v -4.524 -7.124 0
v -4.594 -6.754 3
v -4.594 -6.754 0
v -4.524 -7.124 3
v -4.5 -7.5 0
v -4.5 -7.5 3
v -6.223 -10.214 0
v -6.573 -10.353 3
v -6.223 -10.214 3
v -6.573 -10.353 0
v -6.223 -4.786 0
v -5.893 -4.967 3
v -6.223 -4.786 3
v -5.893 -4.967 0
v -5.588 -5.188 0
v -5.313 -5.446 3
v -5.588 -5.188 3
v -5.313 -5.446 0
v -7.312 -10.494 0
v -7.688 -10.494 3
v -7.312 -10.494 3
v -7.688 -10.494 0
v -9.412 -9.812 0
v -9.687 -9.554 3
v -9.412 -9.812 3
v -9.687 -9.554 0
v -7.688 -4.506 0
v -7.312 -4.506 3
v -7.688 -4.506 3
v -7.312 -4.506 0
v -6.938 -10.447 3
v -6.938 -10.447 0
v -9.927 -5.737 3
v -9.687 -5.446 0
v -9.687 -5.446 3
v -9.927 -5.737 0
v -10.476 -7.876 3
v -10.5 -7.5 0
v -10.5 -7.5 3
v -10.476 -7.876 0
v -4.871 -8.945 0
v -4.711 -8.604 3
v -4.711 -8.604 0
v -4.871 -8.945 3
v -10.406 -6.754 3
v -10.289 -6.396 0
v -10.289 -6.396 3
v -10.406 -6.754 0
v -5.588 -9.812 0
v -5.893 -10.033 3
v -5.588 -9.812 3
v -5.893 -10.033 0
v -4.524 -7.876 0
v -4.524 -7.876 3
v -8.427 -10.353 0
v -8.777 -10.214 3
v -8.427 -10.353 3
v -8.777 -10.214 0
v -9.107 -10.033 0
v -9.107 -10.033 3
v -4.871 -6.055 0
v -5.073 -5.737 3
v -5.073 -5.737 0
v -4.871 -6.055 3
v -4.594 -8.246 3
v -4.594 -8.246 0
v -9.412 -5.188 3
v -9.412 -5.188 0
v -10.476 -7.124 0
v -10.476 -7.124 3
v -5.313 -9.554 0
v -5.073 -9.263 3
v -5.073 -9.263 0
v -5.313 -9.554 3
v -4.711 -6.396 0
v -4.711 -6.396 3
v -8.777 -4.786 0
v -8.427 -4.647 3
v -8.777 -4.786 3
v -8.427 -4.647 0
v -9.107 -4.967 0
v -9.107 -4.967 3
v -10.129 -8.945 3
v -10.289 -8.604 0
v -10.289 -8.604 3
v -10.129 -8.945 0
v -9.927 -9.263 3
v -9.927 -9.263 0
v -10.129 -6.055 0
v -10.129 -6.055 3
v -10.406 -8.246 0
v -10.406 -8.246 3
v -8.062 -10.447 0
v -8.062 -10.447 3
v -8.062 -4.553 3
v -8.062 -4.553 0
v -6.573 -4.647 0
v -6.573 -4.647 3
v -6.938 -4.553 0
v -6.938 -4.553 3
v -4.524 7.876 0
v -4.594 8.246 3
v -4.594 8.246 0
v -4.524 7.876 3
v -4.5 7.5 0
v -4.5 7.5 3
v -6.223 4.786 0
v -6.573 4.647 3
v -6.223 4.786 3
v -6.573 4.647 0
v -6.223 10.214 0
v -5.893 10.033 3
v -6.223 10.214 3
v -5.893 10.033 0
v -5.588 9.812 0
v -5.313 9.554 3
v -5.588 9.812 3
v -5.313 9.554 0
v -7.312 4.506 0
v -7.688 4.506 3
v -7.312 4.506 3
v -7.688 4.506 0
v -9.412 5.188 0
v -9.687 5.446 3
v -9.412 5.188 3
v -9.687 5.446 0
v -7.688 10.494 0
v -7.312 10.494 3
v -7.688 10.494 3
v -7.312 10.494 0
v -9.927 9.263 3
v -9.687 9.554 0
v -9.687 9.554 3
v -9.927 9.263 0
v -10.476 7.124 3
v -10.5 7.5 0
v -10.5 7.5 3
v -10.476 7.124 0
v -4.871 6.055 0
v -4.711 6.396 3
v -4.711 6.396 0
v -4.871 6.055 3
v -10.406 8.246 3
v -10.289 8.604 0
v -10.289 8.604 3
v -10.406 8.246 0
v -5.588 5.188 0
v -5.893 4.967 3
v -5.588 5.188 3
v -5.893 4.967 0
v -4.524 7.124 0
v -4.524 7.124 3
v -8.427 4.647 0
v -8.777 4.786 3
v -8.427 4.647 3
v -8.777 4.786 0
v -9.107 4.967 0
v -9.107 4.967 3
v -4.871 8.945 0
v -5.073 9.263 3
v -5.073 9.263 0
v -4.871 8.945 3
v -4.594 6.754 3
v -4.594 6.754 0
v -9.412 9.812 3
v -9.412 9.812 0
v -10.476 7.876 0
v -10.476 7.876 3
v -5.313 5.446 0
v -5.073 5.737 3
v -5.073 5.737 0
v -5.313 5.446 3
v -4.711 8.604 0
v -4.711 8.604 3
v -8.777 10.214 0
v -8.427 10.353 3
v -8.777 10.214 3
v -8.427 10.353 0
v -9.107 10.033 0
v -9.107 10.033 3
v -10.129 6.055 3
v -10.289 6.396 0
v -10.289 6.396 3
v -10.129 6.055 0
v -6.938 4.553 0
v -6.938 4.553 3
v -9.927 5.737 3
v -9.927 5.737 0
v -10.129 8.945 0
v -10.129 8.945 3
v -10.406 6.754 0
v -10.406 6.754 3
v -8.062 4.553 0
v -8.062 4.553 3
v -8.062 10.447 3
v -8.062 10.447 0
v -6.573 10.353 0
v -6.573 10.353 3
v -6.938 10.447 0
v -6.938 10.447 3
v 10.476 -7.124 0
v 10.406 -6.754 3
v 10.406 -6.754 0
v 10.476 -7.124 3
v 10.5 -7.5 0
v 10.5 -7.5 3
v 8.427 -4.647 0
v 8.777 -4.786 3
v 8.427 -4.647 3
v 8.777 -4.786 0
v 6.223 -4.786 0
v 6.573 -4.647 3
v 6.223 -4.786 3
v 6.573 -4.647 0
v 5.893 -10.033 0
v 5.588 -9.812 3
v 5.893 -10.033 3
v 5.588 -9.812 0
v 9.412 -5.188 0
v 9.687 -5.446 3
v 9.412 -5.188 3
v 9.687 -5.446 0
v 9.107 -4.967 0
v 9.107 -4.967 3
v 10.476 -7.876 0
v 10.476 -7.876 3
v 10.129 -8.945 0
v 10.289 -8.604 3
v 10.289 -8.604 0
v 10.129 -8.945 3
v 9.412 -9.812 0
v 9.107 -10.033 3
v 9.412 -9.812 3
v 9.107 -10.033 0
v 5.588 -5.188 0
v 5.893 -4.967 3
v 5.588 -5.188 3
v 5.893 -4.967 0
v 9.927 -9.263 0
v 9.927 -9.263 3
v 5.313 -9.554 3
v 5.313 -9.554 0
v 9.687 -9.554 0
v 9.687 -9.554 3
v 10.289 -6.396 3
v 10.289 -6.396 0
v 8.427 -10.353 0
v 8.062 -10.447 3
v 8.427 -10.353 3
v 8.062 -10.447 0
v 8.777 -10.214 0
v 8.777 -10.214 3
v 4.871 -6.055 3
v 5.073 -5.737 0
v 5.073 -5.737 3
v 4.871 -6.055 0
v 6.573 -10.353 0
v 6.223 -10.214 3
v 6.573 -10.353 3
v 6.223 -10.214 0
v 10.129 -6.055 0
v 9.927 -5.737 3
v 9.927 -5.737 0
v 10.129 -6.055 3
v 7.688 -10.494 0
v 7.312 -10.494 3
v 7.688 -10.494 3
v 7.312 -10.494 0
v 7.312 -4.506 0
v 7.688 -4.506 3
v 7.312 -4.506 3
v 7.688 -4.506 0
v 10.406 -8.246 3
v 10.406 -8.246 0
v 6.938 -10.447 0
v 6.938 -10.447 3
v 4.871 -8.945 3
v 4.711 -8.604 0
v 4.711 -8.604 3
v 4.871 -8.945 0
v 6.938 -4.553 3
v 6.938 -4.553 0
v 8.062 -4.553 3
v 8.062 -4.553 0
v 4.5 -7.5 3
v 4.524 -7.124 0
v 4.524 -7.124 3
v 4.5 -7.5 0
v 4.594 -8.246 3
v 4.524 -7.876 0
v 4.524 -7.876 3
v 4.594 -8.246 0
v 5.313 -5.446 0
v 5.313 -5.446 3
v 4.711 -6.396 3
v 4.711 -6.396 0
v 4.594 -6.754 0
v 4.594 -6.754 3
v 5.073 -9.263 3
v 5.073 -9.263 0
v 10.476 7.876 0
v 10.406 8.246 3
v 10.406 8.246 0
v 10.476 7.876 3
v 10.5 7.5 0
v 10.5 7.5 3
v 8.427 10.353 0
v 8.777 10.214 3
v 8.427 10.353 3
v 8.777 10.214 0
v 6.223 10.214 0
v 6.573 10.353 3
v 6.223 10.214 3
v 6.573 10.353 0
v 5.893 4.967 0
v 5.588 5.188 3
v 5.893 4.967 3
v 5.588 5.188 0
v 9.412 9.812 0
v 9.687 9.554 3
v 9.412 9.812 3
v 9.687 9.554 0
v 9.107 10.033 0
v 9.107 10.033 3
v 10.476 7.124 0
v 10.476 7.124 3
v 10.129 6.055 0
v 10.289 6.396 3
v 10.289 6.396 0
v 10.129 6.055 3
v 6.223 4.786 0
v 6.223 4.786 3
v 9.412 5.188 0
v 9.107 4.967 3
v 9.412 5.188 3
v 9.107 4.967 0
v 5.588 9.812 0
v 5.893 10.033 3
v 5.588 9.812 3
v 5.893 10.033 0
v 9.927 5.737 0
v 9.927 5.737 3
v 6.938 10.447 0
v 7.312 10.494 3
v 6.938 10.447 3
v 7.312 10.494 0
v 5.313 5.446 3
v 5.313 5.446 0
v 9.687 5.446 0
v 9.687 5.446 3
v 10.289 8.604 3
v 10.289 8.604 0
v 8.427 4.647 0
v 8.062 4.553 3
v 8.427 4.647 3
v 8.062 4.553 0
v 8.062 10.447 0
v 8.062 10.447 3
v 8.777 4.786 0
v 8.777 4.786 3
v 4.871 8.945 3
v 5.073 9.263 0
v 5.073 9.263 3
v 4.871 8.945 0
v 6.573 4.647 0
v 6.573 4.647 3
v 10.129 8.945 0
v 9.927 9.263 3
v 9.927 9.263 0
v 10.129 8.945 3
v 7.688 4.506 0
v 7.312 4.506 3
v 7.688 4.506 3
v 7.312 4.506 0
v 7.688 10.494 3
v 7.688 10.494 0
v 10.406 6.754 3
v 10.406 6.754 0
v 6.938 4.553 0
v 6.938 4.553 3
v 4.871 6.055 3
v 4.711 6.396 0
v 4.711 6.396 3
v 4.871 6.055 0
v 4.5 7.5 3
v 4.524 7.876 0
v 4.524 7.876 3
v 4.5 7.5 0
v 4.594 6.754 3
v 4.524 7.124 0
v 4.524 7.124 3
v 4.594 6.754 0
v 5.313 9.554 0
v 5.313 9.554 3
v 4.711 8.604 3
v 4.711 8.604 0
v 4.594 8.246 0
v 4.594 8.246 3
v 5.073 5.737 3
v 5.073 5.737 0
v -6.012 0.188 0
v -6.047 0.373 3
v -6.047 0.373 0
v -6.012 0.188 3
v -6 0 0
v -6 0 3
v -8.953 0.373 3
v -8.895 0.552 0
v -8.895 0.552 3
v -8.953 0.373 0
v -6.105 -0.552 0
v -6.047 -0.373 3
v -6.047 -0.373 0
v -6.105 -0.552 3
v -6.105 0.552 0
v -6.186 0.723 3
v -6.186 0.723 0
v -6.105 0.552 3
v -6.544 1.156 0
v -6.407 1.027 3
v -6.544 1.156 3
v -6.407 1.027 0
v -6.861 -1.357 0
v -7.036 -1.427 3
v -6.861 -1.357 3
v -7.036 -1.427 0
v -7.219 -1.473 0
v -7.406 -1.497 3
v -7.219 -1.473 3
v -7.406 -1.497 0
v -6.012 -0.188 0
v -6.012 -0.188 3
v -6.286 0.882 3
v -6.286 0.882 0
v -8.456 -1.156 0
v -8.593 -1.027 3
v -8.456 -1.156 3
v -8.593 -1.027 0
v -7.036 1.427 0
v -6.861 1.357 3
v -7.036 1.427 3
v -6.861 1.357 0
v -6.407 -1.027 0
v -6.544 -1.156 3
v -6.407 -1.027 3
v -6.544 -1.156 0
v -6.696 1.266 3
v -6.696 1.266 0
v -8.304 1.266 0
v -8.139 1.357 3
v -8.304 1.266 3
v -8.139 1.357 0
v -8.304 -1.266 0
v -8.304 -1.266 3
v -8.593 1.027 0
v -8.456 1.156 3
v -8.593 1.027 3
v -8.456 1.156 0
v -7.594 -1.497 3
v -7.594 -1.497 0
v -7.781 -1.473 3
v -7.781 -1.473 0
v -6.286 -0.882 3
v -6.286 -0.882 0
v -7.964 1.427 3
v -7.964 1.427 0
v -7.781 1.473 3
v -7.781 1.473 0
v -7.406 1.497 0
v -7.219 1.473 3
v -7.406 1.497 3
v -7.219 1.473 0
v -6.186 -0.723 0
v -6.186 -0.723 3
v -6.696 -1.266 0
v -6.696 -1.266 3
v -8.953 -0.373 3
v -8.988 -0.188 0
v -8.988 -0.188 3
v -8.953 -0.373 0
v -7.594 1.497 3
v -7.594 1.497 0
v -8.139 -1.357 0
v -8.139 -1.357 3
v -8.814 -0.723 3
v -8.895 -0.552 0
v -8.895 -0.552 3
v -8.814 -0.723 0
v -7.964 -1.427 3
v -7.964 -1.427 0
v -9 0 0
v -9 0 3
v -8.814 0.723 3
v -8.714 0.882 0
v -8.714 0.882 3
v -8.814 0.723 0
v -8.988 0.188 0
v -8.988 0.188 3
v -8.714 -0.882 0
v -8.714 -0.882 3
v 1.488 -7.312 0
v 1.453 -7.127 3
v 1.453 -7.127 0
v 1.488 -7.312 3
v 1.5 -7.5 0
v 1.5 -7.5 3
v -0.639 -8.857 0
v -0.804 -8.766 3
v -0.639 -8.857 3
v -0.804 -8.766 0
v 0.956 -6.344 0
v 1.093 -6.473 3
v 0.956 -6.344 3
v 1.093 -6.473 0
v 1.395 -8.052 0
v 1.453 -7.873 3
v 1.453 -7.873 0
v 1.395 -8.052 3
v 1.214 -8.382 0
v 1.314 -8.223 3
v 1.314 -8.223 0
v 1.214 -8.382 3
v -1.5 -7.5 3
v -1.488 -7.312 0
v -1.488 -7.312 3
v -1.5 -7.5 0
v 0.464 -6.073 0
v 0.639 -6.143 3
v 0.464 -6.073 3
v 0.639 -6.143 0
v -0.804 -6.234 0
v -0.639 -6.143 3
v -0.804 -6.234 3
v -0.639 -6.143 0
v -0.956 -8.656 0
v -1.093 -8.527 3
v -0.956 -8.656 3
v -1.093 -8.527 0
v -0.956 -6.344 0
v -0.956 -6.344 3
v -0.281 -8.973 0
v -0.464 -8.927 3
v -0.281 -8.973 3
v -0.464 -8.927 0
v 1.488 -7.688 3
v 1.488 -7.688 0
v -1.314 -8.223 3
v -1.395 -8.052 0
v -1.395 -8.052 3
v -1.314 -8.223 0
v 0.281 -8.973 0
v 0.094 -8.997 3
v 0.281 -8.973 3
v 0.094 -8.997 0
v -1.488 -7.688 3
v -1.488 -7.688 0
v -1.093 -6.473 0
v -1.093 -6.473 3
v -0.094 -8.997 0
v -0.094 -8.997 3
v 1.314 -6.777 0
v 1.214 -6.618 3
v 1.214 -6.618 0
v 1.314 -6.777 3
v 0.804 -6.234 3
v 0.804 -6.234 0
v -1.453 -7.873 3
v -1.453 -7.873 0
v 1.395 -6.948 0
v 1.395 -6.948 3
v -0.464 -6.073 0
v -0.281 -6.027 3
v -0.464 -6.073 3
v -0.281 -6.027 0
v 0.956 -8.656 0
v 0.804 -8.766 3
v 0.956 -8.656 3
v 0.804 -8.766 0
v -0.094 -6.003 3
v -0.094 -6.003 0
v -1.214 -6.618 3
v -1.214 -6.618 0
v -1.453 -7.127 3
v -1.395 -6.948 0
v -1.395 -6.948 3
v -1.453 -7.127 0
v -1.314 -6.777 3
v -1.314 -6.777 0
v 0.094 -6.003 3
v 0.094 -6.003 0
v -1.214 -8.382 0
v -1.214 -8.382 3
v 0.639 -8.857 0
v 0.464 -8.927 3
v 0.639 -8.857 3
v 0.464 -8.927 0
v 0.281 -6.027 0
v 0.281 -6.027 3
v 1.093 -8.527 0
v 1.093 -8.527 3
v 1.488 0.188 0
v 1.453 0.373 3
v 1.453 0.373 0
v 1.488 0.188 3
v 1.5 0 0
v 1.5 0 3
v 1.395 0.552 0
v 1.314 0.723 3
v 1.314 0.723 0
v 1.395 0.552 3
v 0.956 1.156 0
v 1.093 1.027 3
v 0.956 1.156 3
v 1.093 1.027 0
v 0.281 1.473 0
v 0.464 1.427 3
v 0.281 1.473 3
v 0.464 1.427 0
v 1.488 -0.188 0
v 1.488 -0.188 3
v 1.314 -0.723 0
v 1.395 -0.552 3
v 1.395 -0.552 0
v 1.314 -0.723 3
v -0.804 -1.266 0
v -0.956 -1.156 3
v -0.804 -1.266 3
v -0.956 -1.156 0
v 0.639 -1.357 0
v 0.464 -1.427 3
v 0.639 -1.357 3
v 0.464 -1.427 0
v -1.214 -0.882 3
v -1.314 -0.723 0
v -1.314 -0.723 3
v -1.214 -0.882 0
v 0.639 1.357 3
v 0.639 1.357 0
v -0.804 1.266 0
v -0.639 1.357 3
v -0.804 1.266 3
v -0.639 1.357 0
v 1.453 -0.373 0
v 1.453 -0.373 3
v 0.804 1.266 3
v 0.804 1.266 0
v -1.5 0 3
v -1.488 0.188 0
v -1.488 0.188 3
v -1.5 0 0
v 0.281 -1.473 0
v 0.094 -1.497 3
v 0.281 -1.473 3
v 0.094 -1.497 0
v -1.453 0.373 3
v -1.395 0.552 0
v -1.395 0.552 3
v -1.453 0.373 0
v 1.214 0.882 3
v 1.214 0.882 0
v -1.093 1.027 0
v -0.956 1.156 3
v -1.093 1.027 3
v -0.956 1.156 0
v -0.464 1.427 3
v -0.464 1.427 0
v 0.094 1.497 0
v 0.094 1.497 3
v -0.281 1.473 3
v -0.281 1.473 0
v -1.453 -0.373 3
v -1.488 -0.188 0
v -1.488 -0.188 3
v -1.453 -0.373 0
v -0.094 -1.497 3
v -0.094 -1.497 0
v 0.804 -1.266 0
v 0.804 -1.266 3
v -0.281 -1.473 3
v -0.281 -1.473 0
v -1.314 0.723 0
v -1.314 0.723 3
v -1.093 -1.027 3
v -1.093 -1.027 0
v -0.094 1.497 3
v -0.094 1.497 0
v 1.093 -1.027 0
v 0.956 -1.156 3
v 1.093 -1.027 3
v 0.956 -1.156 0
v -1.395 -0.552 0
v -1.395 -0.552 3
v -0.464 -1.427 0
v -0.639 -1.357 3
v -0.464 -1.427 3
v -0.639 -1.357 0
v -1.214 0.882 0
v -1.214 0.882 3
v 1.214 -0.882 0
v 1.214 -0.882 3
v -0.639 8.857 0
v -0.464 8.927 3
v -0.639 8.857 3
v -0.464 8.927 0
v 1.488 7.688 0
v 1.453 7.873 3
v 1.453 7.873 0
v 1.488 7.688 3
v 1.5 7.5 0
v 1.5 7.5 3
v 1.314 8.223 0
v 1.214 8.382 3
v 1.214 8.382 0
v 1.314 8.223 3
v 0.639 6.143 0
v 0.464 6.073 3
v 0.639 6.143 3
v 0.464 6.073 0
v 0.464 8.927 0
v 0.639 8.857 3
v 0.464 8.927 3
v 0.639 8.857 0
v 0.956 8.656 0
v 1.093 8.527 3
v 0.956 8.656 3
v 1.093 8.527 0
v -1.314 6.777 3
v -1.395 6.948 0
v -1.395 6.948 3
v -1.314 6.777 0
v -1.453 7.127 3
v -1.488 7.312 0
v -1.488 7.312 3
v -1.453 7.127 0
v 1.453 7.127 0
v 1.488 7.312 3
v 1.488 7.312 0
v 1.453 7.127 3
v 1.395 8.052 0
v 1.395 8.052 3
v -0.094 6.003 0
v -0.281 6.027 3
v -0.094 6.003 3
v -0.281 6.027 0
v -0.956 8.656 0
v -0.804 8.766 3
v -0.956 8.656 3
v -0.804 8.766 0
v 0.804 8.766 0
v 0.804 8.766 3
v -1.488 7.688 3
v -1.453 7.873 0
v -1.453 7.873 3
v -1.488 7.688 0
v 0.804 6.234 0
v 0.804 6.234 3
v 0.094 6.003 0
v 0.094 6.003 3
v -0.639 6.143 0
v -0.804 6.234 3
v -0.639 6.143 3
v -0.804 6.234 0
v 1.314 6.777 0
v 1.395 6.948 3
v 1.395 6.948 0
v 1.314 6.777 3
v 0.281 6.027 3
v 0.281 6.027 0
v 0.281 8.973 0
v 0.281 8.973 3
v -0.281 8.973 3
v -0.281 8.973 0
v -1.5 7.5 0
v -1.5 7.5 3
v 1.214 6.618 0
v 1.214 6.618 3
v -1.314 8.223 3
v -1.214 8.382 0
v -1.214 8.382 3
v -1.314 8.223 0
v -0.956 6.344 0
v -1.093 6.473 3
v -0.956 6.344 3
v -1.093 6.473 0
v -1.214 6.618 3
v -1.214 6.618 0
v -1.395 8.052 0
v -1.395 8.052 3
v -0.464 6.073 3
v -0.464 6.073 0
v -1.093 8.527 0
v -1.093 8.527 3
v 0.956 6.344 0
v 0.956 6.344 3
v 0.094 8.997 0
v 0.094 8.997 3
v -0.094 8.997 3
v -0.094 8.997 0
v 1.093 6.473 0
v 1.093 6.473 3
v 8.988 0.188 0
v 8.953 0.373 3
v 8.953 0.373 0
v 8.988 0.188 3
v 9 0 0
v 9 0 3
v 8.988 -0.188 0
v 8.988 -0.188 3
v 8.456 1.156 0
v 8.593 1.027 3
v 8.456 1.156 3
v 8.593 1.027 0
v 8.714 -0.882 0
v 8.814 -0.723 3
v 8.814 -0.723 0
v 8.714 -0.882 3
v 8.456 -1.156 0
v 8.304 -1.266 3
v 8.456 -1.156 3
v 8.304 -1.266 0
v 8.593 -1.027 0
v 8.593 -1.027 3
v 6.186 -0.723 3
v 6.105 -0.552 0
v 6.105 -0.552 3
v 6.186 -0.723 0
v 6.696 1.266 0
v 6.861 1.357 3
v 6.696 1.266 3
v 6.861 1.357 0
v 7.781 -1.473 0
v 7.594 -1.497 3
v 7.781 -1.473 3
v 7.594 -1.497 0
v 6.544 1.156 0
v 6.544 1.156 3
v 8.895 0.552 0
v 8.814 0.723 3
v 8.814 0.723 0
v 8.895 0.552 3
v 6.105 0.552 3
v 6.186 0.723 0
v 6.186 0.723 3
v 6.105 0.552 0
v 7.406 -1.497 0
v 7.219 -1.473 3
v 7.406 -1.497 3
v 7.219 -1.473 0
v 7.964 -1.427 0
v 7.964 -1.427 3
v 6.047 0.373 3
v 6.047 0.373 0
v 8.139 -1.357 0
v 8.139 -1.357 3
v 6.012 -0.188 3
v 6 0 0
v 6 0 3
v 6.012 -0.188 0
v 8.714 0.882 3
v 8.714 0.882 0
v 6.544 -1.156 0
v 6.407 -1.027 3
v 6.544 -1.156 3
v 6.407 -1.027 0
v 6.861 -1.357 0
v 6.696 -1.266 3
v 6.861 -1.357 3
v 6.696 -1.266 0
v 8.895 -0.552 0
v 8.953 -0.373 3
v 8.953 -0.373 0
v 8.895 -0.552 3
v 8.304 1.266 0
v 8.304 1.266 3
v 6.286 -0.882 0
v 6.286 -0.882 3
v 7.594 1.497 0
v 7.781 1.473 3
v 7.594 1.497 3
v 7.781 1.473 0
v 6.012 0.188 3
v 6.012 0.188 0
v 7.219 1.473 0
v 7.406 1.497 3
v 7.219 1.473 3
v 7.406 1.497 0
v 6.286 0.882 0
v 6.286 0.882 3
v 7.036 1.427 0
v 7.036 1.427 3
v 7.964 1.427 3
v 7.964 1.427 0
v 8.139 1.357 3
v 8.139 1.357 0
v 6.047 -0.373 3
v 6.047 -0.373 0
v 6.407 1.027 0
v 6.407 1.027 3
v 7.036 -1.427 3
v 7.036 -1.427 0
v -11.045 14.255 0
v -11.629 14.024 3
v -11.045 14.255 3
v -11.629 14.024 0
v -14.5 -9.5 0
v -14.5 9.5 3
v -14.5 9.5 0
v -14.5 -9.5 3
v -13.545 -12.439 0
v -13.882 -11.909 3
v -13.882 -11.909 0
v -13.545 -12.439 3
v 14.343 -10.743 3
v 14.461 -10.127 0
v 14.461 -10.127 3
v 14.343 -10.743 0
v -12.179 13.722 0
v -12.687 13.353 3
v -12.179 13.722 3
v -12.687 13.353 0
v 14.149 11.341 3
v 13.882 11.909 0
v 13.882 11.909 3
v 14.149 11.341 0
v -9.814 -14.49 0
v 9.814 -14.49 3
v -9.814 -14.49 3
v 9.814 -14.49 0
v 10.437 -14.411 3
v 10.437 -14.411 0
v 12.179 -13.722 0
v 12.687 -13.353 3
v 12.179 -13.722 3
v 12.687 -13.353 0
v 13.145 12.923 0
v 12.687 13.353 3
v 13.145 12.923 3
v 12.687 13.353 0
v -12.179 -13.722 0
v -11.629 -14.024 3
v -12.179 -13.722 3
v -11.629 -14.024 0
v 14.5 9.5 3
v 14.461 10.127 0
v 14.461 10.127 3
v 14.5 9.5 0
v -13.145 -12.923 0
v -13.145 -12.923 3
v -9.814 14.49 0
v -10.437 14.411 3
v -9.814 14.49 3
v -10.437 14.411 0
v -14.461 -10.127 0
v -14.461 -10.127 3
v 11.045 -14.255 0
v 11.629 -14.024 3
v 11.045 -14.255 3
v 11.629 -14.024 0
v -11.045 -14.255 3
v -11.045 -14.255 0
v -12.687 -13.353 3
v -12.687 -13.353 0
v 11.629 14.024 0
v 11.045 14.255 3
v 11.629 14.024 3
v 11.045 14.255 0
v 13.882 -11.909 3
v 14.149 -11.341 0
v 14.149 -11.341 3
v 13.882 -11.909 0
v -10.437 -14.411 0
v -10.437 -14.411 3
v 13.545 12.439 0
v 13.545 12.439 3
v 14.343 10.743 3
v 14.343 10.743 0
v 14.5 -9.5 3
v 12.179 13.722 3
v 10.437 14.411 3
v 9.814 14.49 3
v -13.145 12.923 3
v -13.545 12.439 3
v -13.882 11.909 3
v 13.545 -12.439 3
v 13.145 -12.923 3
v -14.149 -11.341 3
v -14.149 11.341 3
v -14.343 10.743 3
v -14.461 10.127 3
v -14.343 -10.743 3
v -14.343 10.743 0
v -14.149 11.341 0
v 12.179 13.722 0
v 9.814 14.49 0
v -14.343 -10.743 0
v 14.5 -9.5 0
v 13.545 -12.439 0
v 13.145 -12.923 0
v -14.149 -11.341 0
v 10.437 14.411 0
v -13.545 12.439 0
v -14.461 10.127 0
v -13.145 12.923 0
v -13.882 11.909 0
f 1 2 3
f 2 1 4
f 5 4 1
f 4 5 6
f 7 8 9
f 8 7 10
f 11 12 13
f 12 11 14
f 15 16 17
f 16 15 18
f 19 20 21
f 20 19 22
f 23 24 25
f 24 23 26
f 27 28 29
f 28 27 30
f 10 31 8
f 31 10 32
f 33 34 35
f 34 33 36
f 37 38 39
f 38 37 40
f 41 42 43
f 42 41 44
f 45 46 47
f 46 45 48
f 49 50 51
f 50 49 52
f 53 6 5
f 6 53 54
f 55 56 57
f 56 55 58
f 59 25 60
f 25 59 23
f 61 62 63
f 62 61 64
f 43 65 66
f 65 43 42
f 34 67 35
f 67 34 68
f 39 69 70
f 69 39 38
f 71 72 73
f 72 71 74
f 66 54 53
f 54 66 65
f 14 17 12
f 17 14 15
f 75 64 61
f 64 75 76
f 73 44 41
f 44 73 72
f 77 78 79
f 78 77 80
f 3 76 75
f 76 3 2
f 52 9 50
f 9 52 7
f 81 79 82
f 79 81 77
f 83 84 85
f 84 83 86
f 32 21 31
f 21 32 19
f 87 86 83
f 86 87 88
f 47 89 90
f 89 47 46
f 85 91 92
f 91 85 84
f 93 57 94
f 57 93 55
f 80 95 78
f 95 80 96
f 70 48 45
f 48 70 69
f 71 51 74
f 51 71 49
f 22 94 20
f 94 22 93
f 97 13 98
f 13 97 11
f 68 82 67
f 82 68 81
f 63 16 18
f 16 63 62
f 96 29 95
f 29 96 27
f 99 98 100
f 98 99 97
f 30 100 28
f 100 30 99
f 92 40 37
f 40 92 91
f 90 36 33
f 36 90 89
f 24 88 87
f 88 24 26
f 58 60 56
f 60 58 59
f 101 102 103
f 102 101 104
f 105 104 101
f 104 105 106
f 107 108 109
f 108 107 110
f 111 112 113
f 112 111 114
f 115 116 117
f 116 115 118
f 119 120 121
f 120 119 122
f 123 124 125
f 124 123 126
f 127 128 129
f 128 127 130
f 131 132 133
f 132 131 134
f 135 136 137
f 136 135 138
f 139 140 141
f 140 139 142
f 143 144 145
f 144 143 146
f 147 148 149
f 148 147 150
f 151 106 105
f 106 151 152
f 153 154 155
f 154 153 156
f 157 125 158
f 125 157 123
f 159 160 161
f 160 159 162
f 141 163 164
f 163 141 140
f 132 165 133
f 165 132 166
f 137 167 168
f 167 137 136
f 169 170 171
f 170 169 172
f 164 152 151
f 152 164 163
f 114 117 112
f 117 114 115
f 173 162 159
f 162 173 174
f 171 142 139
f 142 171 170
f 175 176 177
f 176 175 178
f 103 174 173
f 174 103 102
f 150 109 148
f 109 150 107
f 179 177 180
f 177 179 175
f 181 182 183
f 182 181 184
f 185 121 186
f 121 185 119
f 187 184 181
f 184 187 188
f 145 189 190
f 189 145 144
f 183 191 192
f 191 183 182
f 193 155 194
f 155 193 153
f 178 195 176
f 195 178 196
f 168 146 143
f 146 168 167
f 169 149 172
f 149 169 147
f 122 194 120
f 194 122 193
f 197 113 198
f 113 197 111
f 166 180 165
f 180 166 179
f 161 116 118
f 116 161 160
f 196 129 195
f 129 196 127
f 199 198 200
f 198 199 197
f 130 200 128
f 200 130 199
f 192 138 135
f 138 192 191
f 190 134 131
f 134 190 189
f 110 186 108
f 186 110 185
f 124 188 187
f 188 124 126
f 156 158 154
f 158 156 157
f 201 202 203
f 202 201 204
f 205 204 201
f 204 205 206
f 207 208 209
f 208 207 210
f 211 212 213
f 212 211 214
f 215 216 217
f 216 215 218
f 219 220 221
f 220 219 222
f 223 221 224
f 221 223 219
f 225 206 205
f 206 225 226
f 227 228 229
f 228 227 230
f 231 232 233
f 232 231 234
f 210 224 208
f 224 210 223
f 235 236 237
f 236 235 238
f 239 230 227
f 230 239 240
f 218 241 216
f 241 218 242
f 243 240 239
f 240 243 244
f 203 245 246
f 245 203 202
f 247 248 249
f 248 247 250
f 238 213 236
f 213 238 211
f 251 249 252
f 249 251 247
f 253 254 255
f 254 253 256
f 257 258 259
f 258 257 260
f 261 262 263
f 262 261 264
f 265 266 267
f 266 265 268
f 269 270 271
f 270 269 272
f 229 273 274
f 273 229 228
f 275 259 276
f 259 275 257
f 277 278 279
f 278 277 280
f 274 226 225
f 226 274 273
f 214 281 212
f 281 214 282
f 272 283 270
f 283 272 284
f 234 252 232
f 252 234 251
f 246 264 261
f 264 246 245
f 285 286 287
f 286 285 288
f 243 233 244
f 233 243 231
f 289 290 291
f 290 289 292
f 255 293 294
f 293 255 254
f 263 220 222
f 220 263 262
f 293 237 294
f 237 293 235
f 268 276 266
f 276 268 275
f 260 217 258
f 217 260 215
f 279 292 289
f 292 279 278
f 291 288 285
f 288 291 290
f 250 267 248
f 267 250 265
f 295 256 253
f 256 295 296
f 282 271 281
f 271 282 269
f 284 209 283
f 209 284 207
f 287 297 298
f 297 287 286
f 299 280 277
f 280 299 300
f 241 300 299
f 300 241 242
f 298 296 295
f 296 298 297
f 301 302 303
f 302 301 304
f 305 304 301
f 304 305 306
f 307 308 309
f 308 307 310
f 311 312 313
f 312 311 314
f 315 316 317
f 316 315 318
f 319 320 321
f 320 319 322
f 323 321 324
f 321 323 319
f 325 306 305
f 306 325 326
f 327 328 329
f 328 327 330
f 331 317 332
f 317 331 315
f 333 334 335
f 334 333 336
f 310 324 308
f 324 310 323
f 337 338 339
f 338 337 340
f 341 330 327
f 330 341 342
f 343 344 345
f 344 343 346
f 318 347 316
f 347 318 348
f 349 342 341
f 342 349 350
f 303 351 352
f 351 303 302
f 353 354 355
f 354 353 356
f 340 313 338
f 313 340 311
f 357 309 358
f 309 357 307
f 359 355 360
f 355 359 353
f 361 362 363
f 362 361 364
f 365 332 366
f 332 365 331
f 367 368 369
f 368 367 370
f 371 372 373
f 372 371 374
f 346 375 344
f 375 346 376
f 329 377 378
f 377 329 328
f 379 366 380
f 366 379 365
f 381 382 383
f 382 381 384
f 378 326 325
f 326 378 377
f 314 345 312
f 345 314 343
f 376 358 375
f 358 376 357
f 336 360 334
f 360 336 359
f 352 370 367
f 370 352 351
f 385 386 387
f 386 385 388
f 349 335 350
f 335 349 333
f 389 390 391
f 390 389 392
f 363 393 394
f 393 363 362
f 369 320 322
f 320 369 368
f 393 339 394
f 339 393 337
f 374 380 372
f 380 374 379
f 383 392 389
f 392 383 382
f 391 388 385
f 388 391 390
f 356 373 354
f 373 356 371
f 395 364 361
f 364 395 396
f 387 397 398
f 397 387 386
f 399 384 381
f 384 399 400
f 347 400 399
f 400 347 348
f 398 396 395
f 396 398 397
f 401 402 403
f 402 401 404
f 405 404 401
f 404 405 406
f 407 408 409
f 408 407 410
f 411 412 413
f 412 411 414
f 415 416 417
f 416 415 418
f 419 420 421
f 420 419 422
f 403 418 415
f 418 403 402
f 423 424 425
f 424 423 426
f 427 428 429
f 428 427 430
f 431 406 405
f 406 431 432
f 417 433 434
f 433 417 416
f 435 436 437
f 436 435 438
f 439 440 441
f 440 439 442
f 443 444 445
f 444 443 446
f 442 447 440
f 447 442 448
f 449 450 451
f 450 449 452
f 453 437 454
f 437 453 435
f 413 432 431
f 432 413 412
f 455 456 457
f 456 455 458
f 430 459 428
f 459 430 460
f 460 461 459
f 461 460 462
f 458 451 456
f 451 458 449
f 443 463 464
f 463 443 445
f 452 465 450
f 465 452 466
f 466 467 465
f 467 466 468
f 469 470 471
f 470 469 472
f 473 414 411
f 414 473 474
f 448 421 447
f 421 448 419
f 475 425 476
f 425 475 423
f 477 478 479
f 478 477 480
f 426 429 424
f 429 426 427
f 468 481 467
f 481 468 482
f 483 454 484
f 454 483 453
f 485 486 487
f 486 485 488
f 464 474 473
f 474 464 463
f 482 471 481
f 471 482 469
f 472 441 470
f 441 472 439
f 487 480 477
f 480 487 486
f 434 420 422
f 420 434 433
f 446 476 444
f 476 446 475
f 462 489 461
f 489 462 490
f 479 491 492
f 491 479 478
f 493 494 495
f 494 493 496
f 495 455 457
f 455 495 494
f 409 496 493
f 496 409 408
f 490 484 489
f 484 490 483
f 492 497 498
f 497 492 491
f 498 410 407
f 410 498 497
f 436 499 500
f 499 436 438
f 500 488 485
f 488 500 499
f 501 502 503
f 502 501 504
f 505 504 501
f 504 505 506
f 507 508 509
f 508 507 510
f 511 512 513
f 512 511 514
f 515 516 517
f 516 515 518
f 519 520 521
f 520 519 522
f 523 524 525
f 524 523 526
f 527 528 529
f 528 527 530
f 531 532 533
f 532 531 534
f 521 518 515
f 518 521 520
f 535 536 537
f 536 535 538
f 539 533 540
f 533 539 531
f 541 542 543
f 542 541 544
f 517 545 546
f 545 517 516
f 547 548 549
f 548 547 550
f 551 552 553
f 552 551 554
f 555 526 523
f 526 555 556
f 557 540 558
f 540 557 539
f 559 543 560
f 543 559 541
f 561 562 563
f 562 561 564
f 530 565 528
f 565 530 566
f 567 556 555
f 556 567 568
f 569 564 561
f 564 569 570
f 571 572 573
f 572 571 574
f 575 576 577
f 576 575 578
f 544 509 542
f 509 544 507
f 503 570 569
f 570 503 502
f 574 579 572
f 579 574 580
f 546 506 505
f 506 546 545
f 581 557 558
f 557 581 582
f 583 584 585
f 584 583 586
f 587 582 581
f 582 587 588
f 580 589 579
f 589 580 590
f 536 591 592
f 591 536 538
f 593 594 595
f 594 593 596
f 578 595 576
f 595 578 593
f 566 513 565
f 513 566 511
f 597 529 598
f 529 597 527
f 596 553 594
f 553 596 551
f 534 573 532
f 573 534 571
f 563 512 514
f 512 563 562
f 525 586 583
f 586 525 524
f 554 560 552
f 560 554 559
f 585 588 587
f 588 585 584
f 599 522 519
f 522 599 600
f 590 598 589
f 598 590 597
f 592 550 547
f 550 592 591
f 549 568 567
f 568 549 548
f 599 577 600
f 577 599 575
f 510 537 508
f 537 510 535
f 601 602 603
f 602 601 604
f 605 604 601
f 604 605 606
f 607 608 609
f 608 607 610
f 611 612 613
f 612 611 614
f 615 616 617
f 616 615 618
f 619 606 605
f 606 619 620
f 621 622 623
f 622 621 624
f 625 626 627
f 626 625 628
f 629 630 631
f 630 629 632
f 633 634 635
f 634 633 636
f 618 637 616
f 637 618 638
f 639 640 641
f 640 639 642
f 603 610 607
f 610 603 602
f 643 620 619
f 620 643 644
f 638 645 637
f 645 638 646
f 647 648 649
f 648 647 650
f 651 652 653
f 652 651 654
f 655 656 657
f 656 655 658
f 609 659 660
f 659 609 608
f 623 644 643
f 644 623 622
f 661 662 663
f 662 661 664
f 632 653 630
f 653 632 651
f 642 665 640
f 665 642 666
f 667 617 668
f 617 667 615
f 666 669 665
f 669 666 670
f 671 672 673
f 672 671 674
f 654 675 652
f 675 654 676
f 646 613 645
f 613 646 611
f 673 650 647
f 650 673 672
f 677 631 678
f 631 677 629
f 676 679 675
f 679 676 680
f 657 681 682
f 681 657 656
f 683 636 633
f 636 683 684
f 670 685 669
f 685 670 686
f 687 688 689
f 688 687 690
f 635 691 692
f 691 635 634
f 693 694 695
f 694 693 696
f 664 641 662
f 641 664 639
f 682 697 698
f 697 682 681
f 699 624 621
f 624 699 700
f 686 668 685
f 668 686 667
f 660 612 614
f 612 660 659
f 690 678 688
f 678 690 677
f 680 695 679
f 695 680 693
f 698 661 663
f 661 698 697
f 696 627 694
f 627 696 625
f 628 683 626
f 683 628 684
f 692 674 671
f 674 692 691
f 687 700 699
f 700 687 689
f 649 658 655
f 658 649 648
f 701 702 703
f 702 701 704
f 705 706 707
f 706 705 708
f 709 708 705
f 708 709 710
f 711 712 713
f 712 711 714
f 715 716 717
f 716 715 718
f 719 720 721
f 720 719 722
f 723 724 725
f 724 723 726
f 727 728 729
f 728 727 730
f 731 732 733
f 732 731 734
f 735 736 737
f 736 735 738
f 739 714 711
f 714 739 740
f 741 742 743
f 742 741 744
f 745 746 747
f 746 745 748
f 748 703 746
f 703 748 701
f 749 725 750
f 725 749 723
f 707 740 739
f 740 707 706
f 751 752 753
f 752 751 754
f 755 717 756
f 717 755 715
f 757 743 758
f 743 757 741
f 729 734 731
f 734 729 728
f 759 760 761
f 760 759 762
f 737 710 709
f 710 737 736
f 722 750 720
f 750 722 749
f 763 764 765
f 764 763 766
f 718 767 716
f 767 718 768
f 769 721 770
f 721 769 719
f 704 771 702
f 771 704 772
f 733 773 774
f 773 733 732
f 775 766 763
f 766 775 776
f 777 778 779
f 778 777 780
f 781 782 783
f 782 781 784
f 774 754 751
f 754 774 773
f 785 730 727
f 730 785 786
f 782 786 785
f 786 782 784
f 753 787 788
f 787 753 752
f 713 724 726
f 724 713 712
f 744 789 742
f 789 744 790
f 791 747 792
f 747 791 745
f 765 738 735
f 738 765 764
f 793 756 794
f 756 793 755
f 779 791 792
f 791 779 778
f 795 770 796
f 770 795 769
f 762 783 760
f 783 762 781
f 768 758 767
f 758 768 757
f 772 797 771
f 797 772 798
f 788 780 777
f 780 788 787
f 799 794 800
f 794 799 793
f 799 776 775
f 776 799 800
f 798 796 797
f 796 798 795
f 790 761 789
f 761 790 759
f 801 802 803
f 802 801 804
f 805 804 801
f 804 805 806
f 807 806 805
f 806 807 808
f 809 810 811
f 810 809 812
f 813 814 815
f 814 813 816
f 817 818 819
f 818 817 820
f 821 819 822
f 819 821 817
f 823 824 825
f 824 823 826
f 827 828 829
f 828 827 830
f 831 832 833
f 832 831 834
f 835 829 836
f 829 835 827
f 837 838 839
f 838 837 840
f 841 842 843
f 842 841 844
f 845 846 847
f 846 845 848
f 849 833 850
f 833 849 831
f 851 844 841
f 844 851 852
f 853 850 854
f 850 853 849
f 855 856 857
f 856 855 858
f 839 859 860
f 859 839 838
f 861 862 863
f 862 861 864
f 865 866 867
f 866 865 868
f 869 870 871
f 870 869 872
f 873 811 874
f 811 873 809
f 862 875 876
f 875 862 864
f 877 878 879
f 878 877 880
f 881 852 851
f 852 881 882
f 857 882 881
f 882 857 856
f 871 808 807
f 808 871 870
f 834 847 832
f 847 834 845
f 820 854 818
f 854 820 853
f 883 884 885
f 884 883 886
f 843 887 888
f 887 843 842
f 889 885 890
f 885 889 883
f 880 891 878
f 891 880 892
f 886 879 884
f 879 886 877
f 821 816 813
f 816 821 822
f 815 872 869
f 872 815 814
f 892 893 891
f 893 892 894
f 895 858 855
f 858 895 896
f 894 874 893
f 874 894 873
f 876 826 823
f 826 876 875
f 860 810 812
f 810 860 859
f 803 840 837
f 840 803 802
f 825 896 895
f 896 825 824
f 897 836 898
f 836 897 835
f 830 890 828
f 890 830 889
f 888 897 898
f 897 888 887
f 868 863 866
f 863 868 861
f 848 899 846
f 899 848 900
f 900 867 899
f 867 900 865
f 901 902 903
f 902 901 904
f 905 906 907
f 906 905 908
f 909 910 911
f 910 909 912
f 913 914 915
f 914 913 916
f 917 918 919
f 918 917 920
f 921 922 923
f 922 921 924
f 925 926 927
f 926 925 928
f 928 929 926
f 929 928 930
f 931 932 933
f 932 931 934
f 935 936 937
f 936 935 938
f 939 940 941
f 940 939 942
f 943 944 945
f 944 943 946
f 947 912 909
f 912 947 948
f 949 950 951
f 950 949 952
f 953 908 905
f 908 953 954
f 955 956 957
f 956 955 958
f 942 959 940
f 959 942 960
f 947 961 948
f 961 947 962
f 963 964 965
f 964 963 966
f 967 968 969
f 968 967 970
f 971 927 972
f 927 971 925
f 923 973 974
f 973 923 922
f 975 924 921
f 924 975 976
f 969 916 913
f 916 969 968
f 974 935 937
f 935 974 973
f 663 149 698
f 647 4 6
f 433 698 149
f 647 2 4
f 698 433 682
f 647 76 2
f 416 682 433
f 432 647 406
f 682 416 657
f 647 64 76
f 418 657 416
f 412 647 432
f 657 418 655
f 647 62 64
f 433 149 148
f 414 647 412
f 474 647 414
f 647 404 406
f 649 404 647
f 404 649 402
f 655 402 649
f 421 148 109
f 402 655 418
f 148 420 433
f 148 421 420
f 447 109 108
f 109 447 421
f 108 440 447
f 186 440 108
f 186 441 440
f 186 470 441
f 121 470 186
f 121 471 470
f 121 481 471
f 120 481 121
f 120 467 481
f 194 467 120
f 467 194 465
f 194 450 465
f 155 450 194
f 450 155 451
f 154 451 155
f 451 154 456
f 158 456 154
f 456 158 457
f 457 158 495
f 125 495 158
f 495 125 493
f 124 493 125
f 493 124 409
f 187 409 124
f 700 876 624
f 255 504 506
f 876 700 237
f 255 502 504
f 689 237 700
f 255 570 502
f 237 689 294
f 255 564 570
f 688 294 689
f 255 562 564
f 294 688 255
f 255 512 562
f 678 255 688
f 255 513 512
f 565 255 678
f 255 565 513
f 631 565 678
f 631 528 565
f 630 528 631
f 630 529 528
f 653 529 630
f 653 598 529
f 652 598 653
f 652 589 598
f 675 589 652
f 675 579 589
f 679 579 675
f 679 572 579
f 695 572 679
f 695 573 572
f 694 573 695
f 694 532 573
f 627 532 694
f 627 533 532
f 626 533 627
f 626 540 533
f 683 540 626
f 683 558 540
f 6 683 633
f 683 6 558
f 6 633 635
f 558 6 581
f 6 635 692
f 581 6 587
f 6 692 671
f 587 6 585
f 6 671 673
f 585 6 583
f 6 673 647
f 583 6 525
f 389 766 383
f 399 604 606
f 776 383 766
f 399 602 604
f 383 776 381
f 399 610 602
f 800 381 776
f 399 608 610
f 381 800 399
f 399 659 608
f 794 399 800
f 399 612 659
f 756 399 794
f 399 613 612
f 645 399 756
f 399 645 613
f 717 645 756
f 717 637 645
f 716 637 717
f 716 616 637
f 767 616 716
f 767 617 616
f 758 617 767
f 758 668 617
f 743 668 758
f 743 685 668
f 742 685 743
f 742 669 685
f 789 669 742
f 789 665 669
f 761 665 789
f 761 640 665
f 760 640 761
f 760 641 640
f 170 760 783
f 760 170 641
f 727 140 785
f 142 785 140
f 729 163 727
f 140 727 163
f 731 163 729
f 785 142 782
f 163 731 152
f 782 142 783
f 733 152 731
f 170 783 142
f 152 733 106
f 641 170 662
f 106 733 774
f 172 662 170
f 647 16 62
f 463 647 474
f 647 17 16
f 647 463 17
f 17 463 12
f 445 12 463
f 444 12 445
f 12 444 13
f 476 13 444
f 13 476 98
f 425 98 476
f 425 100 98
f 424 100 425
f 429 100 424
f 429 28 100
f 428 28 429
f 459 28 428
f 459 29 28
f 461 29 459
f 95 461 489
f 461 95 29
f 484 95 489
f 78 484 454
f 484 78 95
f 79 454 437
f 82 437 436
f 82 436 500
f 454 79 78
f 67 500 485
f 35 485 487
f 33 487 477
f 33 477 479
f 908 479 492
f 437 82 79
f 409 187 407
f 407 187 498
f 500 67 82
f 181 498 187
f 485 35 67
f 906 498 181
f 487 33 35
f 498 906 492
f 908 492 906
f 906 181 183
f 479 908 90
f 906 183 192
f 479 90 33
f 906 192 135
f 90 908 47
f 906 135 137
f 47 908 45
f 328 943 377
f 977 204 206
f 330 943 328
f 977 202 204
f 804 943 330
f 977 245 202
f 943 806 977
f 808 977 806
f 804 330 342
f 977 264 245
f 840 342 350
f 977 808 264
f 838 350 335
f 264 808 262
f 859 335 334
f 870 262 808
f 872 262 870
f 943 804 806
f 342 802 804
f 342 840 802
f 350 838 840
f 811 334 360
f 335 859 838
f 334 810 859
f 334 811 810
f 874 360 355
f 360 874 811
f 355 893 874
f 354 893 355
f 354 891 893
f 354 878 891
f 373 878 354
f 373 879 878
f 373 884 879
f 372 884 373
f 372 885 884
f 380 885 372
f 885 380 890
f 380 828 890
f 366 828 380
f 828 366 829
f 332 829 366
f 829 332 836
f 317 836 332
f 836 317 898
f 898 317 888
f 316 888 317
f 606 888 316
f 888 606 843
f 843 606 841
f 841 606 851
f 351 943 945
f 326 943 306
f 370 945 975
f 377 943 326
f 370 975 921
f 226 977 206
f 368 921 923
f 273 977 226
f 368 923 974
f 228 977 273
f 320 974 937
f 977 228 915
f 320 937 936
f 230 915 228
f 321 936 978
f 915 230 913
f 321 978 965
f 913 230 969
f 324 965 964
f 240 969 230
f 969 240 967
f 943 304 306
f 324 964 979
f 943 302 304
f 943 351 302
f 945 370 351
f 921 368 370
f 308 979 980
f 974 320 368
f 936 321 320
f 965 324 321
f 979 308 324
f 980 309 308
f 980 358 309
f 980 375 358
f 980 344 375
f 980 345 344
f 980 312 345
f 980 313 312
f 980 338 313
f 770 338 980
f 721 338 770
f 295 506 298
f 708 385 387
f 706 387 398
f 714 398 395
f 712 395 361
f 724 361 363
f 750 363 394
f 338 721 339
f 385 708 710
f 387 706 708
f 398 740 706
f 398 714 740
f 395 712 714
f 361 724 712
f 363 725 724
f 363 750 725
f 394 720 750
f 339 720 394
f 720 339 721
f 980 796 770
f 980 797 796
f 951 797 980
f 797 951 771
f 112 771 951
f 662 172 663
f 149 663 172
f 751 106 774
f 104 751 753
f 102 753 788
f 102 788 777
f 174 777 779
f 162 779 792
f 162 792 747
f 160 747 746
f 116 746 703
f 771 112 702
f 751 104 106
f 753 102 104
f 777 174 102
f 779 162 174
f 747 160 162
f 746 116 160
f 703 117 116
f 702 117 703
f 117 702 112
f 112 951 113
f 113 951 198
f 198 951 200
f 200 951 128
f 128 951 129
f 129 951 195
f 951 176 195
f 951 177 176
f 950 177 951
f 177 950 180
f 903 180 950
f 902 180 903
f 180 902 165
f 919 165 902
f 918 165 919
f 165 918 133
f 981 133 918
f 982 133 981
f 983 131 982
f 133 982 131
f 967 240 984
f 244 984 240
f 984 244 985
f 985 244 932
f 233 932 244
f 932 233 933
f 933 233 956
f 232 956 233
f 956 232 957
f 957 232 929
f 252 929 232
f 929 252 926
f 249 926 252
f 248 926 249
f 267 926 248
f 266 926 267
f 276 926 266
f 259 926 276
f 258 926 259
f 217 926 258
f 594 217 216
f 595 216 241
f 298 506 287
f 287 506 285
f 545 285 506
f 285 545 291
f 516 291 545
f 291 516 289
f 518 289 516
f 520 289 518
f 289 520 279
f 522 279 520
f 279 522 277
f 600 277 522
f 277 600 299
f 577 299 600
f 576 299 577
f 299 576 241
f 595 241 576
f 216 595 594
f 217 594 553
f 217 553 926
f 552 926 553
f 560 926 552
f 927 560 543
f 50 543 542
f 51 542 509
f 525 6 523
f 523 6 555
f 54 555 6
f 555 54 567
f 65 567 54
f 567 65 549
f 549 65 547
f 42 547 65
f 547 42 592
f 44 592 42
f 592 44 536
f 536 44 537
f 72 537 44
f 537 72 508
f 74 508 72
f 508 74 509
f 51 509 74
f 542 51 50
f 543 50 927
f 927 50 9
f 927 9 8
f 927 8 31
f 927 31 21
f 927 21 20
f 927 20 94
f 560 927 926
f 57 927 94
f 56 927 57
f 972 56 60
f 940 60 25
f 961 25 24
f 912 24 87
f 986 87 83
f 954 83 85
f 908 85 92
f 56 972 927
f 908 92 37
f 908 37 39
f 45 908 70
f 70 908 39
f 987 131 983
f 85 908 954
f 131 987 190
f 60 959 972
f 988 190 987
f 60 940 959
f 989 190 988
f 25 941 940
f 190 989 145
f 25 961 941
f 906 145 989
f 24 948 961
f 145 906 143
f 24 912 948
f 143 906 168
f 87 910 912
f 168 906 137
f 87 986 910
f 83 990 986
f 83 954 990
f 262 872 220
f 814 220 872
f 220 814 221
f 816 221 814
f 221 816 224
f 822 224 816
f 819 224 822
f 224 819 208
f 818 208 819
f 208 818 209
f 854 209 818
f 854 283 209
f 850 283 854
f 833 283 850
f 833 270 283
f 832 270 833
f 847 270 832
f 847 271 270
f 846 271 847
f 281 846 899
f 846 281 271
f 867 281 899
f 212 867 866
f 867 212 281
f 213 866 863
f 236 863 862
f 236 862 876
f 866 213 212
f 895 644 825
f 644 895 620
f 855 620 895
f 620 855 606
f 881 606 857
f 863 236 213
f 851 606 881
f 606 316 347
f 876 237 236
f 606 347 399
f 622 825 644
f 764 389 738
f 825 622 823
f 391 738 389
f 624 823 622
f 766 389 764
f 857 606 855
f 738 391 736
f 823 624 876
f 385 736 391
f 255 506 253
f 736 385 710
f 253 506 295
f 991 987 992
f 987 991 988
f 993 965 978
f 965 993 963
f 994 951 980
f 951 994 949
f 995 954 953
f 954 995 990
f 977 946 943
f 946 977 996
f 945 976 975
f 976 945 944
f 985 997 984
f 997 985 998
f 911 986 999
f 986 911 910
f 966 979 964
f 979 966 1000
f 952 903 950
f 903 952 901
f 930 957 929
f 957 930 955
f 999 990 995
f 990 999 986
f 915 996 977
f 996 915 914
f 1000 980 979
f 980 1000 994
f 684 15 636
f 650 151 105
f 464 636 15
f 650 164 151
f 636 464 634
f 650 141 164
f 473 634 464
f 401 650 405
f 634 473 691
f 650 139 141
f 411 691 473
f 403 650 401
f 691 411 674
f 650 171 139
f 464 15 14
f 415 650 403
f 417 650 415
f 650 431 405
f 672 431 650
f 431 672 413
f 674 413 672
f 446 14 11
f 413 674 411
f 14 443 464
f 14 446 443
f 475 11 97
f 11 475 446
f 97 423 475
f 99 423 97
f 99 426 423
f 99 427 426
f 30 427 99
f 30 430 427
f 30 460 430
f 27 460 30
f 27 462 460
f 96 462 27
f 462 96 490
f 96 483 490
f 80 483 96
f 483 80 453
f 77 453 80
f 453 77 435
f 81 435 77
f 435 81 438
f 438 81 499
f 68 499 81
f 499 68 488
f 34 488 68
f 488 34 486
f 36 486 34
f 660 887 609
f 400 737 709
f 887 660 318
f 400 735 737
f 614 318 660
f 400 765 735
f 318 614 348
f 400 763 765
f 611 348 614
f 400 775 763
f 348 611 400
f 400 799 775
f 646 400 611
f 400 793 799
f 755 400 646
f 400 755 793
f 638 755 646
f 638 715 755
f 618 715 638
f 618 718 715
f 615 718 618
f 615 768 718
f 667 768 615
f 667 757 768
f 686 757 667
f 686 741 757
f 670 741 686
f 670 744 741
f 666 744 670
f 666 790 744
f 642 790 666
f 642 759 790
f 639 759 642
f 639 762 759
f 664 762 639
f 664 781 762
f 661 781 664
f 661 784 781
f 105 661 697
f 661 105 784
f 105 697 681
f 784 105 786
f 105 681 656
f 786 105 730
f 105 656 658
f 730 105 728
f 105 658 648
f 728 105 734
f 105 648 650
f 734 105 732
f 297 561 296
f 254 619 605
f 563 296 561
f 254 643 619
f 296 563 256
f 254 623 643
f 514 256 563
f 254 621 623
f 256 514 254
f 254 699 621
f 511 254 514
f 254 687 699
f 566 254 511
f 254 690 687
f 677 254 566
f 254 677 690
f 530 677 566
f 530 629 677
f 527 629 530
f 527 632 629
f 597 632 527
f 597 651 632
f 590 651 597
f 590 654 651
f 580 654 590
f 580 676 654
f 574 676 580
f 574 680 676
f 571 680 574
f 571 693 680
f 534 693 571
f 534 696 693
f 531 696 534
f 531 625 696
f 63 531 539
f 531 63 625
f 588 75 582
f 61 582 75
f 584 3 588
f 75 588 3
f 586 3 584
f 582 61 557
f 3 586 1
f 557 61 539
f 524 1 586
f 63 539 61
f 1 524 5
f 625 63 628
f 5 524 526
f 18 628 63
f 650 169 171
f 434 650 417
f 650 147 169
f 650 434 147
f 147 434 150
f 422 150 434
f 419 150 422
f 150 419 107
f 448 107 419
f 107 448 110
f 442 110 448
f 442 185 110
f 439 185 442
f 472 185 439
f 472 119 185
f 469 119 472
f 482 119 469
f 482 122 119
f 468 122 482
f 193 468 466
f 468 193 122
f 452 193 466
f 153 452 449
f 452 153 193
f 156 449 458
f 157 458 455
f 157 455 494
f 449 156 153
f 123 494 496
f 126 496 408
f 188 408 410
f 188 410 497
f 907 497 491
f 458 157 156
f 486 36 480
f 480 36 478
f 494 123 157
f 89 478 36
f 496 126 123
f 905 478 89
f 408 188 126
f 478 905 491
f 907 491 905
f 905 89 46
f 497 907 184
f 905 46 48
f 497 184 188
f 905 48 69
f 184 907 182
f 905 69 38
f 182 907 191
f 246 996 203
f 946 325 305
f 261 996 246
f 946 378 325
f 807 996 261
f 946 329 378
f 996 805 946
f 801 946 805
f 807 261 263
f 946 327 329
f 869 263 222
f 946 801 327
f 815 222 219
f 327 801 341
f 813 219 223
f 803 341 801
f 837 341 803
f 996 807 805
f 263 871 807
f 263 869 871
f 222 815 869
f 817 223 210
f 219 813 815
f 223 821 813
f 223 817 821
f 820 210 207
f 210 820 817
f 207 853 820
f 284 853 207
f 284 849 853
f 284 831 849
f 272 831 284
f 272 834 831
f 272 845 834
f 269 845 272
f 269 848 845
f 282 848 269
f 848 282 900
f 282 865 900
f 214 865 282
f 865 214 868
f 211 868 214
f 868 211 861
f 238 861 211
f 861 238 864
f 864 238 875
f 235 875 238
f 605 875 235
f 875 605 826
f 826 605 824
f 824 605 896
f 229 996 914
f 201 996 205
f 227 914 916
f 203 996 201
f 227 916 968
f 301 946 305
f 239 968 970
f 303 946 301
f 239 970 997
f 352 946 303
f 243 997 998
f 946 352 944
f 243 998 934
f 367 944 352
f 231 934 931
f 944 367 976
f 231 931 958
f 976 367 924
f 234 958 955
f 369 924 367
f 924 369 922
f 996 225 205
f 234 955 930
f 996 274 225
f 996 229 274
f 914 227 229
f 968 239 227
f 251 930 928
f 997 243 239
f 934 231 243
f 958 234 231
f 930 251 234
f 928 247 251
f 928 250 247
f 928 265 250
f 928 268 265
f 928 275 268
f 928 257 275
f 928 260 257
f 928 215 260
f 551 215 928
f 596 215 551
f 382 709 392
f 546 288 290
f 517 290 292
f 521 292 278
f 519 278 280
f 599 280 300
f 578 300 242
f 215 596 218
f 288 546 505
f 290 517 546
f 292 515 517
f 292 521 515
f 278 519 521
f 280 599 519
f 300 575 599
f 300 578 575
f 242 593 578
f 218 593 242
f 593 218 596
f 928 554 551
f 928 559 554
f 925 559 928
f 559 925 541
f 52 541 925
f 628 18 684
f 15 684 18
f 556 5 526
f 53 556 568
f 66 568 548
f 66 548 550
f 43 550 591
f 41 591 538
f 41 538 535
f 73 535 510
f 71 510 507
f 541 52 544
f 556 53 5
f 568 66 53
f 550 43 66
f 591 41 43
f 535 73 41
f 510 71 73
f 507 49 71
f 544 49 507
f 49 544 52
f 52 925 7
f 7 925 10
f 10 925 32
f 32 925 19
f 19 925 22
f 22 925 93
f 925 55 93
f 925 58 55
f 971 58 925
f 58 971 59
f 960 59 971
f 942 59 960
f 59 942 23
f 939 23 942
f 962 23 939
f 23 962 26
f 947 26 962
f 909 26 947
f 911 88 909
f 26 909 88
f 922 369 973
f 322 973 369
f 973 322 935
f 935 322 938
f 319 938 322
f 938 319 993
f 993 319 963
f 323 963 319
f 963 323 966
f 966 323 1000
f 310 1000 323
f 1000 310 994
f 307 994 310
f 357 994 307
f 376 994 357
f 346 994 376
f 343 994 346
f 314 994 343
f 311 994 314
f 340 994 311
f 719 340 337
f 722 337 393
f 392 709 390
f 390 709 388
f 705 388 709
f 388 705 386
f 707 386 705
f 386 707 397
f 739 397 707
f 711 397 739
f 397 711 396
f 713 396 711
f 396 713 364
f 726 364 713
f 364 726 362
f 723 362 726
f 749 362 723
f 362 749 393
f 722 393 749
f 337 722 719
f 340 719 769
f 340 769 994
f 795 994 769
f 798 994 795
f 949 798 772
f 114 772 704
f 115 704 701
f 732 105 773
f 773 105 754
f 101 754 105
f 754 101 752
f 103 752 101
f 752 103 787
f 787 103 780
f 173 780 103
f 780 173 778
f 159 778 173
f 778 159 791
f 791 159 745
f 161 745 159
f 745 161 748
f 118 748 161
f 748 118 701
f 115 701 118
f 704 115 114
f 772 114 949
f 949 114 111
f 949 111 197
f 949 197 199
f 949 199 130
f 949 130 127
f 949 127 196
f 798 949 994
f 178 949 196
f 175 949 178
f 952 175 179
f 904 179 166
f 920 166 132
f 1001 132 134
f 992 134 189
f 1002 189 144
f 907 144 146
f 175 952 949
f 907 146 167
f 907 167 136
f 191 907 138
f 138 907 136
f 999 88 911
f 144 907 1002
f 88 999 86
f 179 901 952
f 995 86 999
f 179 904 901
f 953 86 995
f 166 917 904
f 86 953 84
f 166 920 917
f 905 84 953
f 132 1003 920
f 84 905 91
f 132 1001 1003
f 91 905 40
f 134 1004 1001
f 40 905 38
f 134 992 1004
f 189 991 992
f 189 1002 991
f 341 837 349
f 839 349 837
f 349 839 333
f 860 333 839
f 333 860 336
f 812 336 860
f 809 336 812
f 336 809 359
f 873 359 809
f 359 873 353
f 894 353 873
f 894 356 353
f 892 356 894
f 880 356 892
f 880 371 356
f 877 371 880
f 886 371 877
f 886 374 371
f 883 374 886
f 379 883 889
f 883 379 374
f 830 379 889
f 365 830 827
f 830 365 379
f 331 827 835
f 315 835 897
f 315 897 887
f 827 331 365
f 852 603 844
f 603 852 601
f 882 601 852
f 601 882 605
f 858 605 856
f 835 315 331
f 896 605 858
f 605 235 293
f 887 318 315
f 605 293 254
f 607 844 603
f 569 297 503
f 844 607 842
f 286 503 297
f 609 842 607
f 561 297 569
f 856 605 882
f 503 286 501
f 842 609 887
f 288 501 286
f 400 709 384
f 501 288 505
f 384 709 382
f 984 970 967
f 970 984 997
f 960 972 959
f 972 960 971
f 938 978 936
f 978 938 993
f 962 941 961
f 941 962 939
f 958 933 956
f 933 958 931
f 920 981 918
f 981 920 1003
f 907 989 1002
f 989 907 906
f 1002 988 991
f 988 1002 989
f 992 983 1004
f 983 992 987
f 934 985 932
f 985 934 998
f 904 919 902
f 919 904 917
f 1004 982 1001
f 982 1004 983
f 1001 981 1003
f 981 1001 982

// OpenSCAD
$fn = 50;


difference() {
	union() {
		hull() {
			translate(v = [-9.5000000000, 9.5000000000, 0]) {
				cylinder(h = 3, r = 5);
			}
			translate(v = [9.5000000000, 9.5000000000, 0]) {
				cylinder(h = 3, r = 5);
			}
			translate(v = [-9.5000000000, -9.5000000000, 0]) {
				cylinder(h = 3, r = 5);
			}
			translate(v = [9.5000000000, -9.5000000000, 0]) {
				cylinder(h = 3, r = 5);
			}
		}
	}
	union() {
		translate(v = [-7.5000000000, -7.5000000000, 0]) {
			translate(v = [0, 0, -100]) {
				cylinder(h = 200, r = 3.0000000000);
			}
		}
		translate(v = [-7.5000000000, 7.5000000000, 0]) {
			translate(v = [0, 0, -100]) {
				cylinder(h = 200, r = 3.0000000000);
			}
		}
		translate(v = [7.5000000000, -7.5000000000, 0]) {
			translate(v = [0, 0, -100]) {
				cylinder(h = 200, r = 3.0000000000);
			}
		}
		translate(v = [7.5000000000, 7.5000000000, 0]) {
			translate(v = [0, 0, -100]) {
				cylinder(h = 200, r = 3.0000000000);
			}
		}
		translate(v = [-7.5000000000, -7.5000000000, 0]) {
			translate(v = [0, 0, -100]) {
				cylinder(h = 200, r = 1.5000000000);
			}
		}
		translate(v = [-7.5000000000, 0.0000000000, 0]) {
			translate(v = [0, 0, -100]) {
				cylinder(h = 200, r = 1.5000000000);
			}
		}
		translate(v = [-7.5000000000, 7.5000000000, 0]) {
			translate(v = [0, 0, -100]) {
				cylinder(h = 200, r = 1.5000000000);
			}
		}
		translate(v = [0.0000000000, -7.5000000000, 0]) {
			translate(v = [0, 0, -100]) {
				cylinder(h = 200, r = 1.5000000000);
			}
		}
		translate(v = [0, 0, -100]) {
			cylinder(h = 200, r = 1.5000000000);
		}
		translate(v = [0.0000000000, 7.5000000000, 0]) {
			translate(v = [0, 0, -100]) {
				cylinder(h = 200, r = 1.5000000000);
			}
		}
		translate(v = [7.5000000000, -7.5000000000, 0]) {
			translate(v = [0, 0, -100]) {
				cylinder(h = 200, r = 1.5000000000);
			}
		}
		translate(v = [7.5000000000, 0.0000000000, 0]) {
			translate(v = [0, 0, -100]) {
				cylinder(h = 200, r = 1.5000000000);
			}
		}
		translate(v = [7.5000000000, 7.5000000000, 0]) {
			translate(v = [0, 0, -100]) {
				cylinder(h = 200, r = 1.5000000000);
			}
		}
	}
}
